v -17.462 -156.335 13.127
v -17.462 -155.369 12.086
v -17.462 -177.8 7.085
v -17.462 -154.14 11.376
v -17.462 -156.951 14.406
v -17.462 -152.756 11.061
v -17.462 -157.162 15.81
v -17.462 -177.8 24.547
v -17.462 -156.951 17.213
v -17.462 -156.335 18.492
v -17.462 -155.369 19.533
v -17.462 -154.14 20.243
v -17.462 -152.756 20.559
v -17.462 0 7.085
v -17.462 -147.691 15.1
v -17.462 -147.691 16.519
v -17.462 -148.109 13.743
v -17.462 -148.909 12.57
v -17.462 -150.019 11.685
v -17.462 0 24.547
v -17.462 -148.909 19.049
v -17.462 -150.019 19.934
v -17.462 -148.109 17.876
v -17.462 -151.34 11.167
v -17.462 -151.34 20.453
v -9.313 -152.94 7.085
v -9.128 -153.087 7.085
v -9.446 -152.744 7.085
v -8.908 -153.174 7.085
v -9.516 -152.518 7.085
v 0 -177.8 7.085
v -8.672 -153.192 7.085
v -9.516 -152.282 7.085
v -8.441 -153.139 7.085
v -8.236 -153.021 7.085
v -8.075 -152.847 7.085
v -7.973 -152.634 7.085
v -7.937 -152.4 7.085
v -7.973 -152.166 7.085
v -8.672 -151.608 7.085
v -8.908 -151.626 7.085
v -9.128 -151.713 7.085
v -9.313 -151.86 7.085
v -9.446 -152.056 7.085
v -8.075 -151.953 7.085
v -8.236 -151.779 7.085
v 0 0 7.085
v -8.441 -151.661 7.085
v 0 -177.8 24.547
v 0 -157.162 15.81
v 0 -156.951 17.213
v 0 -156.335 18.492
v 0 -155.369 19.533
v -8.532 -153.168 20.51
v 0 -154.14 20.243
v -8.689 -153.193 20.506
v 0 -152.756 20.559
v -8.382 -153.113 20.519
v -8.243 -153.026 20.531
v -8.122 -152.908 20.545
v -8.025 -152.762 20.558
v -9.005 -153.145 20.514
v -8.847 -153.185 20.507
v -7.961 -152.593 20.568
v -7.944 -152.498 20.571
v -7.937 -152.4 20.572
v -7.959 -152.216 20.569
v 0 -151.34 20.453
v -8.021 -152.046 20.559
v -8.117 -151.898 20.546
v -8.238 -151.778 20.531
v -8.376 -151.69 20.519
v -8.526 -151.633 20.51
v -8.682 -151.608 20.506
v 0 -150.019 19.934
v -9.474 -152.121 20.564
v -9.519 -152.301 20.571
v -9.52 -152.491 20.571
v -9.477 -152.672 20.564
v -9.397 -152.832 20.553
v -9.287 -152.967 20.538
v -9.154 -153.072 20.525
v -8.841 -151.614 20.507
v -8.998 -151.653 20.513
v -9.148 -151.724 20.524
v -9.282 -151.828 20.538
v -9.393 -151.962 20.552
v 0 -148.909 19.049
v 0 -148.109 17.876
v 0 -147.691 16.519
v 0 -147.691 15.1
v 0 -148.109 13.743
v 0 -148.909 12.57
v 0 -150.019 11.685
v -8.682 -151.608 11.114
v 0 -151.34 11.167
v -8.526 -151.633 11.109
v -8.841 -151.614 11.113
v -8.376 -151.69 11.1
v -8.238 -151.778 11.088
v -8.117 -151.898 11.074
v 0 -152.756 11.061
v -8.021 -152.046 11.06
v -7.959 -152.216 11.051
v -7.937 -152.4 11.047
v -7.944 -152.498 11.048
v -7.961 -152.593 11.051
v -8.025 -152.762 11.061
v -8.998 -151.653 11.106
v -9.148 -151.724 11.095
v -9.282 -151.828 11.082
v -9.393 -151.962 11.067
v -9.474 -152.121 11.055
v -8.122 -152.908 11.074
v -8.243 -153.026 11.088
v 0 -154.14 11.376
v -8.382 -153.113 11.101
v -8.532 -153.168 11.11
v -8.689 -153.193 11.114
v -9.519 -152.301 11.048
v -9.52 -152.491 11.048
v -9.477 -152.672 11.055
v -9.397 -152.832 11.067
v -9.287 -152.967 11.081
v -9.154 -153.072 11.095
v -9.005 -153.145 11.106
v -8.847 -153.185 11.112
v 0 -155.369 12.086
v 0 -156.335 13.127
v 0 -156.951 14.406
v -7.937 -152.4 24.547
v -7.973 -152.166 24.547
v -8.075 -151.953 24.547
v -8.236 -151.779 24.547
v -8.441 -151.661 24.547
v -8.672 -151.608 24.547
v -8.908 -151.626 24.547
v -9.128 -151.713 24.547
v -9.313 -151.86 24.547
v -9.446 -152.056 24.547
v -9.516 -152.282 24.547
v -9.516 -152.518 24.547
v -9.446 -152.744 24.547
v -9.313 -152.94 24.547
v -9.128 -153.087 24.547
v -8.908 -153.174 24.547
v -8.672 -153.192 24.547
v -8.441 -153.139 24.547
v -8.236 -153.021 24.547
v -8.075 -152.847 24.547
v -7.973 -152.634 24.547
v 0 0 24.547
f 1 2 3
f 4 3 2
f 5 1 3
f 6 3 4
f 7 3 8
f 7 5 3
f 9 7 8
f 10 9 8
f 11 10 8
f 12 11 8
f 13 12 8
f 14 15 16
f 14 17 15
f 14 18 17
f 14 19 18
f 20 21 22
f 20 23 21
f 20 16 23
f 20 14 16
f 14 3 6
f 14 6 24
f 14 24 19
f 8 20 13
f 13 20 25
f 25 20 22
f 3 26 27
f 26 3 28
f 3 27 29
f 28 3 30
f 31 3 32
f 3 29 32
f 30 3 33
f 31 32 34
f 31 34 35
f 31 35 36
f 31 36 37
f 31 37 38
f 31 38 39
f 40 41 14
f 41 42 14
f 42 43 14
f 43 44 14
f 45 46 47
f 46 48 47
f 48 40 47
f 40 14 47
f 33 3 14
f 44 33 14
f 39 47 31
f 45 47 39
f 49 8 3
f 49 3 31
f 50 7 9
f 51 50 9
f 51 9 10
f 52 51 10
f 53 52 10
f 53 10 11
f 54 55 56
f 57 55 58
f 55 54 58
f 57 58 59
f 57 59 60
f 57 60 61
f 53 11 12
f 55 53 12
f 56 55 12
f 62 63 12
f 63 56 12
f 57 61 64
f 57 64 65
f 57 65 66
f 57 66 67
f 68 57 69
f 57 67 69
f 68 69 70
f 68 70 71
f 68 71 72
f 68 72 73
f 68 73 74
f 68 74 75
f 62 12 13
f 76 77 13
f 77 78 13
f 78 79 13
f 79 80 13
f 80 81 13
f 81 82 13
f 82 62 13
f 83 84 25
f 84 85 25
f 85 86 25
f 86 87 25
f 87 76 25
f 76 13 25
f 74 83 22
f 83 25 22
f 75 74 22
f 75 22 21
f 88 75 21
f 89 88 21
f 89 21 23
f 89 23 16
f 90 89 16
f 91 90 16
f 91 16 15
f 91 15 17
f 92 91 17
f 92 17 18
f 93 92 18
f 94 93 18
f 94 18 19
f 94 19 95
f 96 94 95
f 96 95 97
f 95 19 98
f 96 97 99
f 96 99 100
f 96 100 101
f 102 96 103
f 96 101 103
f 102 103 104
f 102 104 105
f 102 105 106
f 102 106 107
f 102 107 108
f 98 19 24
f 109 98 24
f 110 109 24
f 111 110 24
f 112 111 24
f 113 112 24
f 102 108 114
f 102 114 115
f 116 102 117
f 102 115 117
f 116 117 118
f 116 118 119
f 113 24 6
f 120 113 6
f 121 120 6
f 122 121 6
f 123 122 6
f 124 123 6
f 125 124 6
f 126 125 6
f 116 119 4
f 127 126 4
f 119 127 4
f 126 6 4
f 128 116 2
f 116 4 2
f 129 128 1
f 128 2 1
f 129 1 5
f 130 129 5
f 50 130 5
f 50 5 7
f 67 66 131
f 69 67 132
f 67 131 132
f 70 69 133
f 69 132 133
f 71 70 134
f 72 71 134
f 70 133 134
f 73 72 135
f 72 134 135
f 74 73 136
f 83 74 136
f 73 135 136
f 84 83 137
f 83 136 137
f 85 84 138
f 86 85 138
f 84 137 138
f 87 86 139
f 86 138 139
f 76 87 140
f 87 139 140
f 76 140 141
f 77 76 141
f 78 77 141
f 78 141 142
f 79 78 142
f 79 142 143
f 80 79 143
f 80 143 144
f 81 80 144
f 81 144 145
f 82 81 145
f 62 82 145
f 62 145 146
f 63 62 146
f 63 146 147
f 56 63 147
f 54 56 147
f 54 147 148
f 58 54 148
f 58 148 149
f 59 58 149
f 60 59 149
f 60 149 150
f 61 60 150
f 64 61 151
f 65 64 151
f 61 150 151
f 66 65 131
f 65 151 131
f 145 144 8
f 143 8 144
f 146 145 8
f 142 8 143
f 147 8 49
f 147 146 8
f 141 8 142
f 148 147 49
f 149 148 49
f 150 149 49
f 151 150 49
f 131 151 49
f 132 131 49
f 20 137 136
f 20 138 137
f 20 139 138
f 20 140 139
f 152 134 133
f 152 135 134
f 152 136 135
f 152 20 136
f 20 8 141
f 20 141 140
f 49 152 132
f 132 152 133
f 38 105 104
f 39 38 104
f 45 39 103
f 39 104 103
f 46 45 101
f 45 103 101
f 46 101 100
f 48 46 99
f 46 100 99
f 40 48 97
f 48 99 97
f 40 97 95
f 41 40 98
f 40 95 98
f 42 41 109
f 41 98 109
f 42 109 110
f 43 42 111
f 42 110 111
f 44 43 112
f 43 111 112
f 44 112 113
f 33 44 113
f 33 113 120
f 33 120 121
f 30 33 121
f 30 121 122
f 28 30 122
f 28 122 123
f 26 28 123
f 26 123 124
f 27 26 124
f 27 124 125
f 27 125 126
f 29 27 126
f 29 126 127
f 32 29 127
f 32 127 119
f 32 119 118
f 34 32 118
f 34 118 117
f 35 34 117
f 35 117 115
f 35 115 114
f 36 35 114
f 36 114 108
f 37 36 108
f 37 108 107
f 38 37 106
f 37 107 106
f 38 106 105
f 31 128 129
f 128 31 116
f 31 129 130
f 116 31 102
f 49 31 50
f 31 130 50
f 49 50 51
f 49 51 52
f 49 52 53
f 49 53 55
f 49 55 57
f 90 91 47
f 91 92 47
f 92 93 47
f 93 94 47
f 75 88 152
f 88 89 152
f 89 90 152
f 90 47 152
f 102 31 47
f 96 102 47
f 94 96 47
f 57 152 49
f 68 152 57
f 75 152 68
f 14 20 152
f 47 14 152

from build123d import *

# Parameters (mm, degrees)
F0_W     = 17.4625
F0_H     = 17.4625
F1_DEPTH = 177.8
F2_R     = 4.7625
F3_DEPTH = 17.4752
F4_R     = 0.79375
F5_DEPTH = 25.4


with BuildPart() as f1:
    # F0 (on Front) → F1 (new body)
    with BuildSketch(Plane.XZ):
        with Locations((-8.73125, 15.816035)):
            Rectangle(F0_W, F0_H)
    extrude(amount=F1_DEPTH)

    # F2 (on face) → F3 (cut)
    with BuildSketch(Plane(origin=(-17.4625, 0, 0), x_dir=(0, -1, 0), z_dir=(-1, 0, 0))):
        with Locations((152.4, 15.809685)):
            Circle(F2_R)
    extrude(amount=-F3_DEPTH, mode=Mode.SUBTRACT)

    # F4 (on face) → F5 (cut)
    with BuildSketch(Plane.XY.offset(24.547285)):
        with Locations((-8.73125, -152.4)):
            Circle(F4_R)
    extrude(amount=-F5_DEPTH, mode=Mode.SUBTRACT)


solid = f1.part
